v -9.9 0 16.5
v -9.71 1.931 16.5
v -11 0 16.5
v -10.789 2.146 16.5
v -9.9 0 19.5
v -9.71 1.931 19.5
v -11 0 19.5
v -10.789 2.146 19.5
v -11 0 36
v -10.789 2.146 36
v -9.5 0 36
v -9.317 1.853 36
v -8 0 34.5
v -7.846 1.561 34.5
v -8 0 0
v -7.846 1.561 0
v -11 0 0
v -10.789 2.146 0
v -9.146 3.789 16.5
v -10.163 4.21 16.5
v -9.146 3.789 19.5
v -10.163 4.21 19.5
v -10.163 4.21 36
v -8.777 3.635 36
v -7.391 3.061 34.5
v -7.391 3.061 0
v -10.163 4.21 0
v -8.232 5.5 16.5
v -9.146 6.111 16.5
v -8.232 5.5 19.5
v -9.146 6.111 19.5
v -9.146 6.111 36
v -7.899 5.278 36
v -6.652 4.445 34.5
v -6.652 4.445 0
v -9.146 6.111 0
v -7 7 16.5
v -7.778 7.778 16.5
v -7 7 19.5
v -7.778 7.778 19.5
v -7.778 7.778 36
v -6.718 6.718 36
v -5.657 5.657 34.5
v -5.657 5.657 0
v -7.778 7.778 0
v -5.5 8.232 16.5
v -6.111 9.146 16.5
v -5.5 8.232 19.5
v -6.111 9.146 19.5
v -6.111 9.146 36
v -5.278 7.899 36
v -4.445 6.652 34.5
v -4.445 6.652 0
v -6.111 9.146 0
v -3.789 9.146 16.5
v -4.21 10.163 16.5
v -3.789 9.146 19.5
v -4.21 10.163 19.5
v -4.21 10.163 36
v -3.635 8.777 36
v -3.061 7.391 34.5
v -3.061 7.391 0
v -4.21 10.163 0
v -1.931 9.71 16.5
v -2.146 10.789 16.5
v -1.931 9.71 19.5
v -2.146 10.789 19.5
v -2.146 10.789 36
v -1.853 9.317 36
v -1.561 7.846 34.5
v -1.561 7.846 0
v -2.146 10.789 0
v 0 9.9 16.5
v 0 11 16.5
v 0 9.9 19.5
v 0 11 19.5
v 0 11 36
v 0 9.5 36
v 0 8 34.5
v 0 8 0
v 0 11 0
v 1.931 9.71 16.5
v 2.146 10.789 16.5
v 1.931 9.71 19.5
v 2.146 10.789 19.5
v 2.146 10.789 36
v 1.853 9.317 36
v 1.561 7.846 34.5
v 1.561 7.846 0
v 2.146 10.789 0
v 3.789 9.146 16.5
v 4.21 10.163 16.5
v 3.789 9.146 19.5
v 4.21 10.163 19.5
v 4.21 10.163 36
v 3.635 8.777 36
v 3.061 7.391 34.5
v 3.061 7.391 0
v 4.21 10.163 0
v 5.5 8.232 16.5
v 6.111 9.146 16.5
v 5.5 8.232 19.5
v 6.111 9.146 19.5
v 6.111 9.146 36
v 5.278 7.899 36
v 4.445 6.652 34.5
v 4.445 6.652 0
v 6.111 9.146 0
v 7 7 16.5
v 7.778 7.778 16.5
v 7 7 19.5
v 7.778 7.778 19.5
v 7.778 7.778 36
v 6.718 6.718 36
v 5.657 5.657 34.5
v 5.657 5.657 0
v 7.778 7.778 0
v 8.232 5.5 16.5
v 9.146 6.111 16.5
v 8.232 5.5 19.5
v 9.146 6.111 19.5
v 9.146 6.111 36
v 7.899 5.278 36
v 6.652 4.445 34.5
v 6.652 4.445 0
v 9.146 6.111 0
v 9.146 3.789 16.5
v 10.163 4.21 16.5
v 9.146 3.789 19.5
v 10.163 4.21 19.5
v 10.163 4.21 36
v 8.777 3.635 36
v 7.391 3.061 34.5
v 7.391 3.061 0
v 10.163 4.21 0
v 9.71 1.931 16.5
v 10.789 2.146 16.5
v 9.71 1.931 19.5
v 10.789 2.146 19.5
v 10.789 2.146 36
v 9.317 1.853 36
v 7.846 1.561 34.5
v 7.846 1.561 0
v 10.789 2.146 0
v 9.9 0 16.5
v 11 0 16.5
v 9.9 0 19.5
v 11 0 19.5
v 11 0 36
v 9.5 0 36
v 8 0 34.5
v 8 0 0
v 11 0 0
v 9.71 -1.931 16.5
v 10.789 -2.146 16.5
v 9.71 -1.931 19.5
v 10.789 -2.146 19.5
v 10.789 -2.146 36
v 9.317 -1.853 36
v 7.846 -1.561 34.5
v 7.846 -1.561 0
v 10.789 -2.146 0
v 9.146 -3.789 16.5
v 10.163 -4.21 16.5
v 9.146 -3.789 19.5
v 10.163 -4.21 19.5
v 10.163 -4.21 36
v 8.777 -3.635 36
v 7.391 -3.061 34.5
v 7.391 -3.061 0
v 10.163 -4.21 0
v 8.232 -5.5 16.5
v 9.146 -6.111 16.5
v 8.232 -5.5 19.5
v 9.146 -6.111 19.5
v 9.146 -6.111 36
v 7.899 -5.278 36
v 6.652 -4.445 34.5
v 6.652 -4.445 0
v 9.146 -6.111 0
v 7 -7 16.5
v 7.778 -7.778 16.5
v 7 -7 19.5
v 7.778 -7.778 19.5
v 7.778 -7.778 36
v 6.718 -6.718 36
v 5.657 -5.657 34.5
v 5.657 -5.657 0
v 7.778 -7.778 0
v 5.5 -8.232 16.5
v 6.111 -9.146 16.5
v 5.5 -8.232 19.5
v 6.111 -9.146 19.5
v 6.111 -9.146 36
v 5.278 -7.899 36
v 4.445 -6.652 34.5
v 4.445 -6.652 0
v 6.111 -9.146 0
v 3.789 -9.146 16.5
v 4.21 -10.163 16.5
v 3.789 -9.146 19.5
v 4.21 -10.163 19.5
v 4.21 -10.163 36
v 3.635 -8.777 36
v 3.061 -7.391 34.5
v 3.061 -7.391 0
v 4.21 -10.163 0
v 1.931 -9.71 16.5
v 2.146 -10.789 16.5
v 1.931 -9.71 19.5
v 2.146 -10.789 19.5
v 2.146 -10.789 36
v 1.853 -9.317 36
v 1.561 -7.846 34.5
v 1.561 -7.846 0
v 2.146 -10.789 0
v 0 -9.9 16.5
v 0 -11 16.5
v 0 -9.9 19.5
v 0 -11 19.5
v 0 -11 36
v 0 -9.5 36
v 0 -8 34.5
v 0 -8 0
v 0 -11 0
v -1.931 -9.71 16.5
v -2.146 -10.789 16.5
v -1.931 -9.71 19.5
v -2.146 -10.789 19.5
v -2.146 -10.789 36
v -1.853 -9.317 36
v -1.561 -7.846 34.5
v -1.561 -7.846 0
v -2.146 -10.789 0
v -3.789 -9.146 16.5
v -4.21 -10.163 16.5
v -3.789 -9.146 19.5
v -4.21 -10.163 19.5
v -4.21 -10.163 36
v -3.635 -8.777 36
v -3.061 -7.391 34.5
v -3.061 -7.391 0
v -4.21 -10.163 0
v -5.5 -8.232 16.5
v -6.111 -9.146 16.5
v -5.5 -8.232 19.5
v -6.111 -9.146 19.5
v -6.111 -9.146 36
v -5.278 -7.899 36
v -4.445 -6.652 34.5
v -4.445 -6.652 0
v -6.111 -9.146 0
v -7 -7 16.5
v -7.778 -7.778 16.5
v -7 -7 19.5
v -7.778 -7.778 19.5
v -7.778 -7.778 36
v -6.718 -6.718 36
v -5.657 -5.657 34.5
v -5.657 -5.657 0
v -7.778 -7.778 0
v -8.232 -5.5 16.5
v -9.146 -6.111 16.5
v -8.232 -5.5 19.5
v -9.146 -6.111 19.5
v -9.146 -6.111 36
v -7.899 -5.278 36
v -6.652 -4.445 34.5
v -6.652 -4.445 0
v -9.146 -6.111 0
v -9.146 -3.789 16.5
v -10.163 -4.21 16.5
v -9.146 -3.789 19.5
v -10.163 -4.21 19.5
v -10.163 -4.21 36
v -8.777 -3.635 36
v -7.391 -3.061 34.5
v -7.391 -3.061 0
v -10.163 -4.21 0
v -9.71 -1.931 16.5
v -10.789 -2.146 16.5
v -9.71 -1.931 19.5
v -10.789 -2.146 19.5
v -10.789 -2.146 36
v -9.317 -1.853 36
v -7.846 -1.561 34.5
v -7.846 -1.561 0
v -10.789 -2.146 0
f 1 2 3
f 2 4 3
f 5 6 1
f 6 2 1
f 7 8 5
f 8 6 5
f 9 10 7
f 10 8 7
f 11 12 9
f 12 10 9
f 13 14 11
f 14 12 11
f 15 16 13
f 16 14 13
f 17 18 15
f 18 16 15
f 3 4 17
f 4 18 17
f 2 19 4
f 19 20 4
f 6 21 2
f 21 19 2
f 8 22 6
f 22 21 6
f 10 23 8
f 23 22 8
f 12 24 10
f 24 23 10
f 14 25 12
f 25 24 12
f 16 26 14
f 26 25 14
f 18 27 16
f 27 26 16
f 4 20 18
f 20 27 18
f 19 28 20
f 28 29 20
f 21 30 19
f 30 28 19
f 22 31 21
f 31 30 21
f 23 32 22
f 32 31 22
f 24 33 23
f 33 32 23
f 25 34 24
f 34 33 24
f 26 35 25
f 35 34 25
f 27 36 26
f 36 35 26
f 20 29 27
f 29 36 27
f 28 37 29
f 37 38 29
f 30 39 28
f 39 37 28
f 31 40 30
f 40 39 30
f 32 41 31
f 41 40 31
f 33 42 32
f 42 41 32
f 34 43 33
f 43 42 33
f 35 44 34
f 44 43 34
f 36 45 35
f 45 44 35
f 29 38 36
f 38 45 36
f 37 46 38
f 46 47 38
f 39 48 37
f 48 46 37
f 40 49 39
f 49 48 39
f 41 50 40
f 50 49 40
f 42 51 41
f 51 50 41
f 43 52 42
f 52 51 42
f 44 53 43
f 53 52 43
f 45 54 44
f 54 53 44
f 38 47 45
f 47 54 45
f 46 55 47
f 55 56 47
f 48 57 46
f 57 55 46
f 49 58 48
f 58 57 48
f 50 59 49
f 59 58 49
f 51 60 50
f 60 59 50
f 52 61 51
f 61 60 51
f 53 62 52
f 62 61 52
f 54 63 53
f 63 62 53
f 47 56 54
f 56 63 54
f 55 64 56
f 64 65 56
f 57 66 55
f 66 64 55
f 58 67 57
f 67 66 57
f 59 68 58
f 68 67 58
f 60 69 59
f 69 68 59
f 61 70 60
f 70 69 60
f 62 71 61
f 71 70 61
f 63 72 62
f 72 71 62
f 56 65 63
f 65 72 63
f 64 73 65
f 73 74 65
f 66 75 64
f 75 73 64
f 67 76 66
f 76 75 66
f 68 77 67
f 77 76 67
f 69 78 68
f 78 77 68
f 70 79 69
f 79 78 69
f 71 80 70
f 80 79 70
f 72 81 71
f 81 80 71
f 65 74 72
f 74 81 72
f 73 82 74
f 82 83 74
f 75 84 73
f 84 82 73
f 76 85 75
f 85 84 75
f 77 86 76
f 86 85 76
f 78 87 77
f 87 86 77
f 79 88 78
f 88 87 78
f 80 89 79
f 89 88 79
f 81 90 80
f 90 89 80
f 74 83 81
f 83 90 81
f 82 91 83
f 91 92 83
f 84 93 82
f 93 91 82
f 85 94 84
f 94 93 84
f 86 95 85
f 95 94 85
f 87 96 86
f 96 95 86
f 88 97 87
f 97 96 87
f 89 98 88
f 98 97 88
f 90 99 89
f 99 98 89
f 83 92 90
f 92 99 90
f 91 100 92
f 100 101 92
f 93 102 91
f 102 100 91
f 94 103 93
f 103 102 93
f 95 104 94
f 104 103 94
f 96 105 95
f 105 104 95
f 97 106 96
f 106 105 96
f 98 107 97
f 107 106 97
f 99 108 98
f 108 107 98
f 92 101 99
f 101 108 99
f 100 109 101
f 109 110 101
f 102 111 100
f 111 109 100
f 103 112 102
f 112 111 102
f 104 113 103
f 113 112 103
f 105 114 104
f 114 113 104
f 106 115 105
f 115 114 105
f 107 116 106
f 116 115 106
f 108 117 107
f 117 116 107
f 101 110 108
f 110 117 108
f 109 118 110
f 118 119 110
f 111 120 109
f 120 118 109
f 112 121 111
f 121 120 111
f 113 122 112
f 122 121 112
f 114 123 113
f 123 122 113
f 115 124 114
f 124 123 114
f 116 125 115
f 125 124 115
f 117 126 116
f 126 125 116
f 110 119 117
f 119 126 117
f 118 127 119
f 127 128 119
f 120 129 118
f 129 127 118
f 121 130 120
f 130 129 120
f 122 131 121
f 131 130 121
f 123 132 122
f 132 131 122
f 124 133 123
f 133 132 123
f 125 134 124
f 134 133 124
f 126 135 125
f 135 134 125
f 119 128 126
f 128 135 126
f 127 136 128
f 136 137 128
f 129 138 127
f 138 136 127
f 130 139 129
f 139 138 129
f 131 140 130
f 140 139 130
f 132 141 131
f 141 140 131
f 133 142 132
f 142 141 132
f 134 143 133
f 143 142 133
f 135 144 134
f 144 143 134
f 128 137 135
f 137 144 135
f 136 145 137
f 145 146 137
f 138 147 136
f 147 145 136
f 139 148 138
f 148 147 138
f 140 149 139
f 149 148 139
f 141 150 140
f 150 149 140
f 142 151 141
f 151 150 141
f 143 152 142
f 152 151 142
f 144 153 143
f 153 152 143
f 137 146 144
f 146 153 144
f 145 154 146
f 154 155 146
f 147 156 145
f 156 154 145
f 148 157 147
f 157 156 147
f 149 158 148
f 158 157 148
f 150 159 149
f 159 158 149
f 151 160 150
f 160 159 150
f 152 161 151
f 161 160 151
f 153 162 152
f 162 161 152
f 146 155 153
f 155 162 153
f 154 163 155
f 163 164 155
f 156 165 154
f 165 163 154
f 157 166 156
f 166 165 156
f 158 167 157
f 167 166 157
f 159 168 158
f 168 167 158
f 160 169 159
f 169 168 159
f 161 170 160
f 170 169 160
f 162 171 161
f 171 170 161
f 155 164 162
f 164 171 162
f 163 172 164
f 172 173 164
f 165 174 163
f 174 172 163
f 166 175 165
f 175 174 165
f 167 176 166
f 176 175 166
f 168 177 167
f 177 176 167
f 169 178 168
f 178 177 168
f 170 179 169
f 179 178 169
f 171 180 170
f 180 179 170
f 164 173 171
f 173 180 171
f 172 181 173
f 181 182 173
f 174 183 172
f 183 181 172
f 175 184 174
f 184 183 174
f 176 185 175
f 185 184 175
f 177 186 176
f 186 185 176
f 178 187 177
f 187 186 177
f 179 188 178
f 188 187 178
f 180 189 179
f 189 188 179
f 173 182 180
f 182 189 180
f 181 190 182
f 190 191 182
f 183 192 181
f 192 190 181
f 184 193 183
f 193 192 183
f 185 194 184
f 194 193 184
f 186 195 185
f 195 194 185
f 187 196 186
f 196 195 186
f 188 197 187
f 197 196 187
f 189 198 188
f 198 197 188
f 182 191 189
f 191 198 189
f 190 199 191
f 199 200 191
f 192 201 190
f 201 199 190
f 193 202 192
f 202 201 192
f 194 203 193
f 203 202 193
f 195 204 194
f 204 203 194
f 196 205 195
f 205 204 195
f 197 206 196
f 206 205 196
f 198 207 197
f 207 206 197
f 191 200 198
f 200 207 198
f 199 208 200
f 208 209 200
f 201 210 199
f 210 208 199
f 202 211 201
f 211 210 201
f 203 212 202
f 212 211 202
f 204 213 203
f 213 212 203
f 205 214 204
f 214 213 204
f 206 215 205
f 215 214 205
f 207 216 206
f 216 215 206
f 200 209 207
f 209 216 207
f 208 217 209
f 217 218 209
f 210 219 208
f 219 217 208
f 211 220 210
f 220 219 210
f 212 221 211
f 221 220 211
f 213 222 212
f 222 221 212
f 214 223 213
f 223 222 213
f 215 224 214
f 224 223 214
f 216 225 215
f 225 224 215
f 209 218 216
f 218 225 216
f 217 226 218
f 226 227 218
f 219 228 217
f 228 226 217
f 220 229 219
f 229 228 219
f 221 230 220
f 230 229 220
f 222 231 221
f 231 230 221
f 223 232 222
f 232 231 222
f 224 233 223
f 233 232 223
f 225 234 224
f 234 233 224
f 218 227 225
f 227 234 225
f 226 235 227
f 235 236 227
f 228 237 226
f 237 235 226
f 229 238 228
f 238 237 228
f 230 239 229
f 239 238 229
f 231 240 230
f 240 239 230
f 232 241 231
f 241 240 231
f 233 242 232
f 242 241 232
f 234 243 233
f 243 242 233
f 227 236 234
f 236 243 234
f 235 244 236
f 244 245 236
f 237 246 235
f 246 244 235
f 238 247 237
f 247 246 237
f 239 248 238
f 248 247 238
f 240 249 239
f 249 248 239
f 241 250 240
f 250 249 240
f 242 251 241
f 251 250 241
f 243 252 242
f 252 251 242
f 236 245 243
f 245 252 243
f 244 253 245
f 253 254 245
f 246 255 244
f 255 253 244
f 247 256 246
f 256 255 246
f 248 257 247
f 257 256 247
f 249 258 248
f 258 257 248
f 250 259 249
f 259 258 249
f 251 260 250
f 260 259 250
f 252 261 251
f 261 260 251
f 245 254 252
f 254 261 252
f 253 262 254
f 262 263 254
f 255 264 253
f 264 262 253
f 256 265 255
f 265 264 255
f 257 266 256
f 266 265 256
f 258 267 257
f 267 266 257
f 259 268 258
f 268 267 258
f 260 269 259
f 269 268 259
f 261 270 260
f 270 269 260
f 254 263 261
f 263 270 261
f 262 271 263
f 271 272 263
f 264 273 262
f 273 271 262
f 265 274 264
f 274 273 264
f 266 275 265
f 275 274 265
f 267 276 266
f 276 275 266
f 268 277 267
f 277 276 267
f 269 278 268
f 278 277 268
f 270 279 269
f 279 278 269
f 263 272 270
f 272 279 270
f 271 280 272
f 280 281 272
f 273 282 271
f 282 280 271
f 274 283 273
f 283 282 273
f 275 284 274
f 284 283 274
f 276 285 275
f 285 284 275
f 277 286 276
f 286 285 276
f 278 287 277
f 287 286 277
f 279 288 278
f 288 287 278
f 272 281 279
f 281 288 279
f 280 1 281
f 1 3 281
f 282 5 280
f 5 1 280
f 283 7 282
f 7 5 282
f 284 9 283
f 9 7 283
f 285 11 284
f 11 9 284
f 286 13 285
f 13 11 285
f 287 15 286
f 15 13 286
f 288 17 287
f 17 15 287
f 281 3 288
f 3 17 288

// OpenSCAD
$fn = 32;

// ----------------------------------------------------------------------
// Grooved revolve: thread_relief, bore R8
// ----------------------------------------------------------------------

// --- parameters (mm) ---
bore_r = 8;               // bore radius
outer_r = 11;             // outer radius of the body
total_h = 36;             // overall height, Z
wall = 3;                 // radial wall thickness
groove_w = 3;             // groove width
groove_d = 1.1;           // groove depth
grooves = 1;              // number of outer grooves
relief = 1.5;             // thread relief leg at the bore mouth
relief_angle = 45;        // thread relief chamfer angle, degrees
fit_tol = 0.02;           // declared fit tolerance (prompt contract)
free_tol = 0.2;           // declared free tolerance (prompt contract)

bbox_x = 2 * outer_r;  // full diameter
bore_d = 2 * bore_r;  // bore diameter
body_d = 2 * outer_r;  // body diameter
revolve_angle = 360;  // full turn around the Z axis

profile = [[8, 0], [11, 0], [11, 16.5], [9.9, 16.5], [9.9, 19.5], [11, 19.5], [11, 36], [9.5, 36], [8, 34.5]];  // primary outline, 9 points, counter clockwise

// --- the one profile operation ---
rotate_extrude(angle = revolve_angle) polygon(points = profile);
